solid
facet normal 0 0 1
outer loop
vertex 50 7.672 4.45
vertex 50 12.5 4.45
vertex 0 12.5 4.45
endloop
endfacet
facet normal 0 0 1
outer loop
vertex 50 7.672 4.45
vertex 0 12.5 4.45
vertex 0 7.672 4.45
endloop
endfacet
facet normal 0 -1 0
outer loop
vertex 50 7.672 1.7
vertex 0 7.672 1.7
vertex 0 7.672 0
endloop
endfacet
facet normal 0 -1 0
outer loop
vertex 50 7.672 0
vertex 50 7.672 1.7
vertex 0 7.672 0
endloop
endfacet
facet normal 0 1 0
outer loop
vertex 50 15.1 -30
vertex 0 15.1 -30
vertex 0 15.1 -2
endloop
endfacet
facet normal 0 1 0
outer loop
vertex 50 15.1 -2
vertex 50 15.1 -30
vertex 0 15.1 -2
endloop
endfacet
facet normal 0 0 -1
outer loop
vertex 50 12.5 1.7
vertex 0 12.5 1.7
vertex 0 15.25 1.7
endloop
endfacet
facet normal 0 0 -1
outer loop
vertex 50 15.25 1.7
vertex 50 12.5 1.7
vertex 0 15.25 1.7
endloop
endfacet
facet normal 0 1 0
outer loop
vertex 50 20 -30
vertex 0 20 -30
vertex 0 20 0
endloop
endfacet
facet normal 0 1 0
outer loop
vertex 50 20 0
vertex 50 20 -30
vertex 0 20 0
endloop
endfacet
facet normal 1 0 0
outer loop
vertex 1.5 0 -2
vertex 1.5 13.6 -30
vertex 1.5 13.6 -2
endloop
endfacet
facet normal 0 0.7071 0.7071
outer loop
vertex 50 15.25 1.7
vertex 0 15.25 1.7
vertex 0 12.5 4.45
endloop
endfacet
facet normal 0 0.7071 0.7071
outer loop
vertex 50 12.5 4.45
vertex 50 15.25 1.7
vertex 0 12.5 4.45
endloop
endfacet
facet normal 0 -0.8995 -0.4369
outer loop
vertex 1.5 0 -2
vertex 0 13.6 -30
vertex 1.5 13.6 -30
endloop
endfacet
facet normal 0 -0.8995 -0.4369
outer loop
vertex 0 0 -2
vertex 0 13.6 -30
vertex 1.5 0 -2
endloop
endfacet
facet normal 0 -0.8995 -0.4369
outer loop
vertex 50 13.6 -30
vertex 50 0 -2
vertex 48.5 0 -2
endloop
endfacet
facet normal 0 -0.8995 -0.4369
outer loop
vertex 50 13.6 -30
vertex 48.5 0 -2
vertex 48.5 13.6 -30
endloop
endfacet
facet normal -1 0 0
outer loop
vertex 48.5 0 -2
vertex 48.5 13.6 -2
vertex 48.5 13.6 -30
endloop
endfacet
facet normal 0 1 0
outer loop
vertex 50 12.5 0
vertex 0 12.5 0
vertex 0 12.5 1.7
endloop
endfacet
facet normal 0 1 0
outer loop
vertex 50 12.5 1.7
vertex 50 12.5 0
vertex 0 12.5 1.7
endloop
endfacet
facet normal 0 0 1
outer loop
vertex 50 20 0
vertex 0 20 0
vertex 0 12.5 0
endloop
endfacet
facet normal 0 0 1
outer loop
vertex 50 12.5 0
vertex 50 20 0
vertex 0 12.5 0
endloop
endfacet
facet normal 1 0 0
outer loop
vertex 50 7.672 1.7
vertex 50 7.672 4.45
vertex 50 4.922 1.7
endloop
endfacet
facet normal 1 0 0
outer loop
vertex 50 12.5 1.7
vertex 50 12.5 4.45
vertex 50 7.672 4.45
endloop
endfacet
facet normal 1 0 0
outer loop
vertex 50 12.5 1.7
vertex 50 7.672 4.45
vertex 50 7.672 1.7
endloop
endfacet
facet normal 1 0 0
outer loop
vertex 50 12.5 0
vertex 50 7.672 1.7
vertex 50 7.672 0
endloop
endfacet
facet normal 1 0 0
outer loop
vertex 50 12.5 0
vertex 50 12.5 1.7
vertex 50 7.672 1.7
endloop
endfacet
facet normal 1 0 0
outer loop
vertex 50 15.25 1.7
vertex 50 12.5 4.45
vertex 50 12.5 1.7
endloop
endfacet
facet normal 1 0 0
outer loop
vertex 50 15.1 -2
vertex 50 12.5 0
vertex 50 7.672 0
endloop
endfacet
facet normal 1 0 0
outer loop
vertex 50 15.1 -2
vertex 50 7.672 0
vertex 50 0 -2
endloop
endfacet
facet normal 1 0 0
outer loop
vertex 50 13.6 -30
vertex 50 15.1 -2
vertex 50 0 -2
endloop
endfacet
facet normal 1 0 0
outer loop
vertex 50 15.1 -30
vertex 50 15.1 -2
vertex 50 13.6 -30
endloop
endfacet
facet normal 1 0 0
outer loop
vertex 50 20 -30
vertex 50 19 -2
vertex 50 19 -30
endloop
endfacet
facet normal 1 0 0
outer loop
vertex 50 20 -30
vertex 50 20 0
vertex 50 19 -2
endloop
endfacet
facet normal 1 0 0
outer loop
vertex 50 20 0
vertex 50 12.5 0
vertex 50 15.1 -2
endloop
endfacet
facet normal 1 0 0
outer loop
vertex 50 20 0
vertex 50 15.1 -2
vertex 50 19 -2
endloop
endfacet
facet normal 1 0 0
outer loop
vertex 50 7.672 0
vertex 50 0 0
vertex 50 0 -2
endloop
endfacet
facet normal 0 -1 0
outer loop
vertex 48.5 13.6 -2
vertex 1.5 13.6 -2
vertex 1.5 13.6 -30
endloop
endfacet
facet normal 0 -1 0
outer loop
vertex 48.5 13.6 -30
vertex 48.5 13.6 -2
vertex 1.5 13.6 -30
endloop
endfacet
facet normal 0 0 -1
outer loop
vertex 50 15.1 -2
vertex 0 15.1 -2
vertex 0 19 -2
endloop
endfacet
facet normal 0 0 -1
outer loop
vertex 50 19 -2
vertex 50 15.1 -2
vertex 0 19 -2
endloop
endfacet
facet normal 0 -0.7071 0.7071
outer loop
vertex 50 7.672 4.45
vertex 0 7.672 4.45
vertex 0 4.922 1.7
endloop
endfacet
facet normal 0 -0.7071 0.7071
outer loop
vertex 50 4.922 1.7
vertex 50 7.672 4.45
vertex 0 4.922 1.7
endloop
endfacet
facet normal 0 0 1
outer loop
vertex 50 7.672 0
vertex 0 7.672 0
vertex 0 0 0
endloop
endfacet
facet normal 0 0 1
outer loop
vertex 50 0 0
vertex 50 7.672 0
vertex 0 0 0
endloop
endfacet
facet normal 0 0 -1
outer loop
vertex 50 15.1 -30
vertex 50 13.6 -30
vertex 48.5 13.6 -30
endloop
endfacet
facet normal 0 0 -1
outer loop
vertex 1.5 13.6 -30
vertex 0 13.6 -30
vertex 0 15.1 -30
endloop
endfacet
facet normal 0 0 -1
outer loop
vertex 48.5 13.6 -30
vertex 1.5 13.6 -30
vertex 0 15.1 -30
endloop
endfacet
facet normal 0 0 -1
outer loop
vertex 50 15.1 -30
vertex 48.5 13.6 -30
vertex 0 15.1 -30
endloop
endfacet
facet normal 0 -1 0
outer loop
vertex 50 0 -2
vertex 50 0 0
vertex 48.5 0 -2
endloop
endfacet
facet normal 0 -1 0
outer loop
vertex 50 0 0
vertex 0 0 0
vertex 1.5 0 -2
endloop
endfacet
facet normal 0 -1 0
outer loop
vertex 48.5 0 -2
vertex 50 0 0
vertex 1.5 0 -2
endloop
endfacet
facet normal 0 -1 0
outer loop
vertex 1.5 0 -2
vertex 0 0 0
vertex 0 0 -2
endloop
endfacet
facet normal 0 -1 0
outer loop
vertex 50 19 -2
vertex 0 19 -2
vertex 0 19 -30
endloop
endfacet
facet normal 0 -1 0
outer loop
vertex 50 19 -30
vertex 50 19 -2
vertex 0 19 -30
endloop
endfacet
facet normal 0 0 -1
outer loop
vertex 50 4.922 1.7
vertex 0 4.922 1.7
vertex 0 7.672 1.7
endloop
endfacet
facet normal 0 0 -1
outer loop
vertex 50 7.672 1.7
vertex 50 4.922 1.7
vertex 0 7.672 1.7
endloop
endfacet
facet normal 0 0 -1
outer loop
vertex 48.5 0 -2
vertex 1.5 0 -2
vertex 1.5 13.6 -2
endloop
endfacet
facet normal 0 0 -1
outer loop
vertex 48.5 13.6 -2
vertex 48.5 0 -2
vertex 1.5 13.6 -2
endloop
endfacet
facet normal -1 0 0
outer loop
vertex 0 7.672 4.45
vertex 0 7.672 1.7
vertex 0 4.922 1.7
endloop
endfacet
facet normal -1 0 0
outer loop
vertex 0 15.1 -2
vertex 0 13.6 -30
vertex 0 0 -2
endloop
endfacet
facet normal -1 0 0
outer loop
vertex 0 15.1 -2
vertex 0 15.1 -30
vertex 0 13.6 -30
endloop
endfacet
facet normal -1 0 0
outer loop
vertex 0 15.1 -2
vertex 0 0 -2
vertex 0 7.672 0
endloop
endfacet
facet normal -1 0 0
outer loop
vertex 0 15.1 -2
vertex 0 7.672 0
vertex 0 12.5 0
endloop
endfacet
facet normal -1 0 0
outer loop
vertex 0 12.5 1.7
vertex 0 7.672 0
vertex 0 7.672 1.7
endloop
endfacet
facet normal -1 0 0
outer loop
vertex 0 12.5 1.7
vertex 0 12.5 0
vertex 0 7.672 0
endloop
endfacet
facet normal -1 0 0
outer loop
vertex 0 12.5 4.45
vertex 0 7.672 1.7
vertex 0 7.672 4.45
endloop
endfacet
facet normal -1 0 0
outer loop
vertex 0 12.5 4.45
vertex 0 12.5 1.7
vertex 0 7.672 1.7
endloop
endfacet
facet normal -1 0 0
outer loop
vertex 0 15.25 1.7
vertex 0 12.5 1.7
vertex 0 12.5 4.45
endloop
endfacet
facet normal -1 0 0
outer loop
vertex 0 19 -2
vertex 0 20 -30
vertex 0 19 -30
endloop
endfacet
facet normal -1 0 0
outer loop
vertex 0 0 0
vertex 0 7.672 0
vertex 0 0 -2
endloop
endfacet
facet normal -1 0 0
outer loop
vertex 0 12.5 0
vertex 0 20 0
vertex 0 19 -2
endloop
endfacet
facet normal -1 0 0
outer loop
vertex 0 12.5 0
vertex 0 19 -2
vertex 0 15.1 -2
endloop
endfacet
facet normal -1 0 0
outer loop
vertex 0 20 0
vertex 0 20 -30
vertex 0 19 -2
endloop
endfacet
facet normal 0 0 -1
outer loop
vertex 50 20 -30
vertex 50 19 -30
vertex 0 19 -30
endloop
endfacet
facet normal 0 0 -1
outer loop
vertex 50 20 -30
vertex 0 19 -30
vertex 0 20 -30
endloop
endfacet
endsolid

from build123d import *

# Parameters (mm, degrees)
BOSS_EXTRUDE2_DEPTH  = 50
BOSS_EXTRUDE10_DEPTH = 1.5
BOSS_EXTRUDE11_DEPTH = 1.5


with BuildPart() as part:
    # Sketch1 → Boss-Extrude2 (new body)
    with BuildSketch(Plane(origin=(0, 0, 0), x_dir=(0, 0, -1), z_dir=(1, 0, 0))):
        Polygon((0, 7.671680622), (0, 0), (2, 0), (2, 13.6), (30, 13.6), (30, 15.1), (2, 15.1), (2, 19), (30, 19), (30, 20), (0, 20), (0, 12.5), (-1.7, 12.5), (-1.7, 15.25), (-4.45, 12.5), (-4.45, 7.671680622), (-1.7, 4.921680622), (-1.7, 7.671680622), align=None)
    extrude(amount=BOSS_EXTRUDE2_DEPTH)

    # Sketch1<13> → Boss-Extrude10 (add)
    with BuildSketch(Plane(origin=(0, 0, 0), x_dir=(0, 0, -1), z_dir=(1, 0, 0))):
        Polygon((2, 13.6), (2, 0), (30, 13.6), align=None)
    extrude(amount=BOSS_EXTRUDE10_DEPTH)

    # Sketch7 → Boss-Extrude11 (add)
    with BuildSketch(Plane(origin=(50, 0, 0), x_dir=(0, 0, -1), z_dir=(1, 0, 0))):
        Polygon((2, 13.6), (2, 0), (30, 13.6), align=None)
    extrude(amount=-BOSS_EXTRUDE11_DEPTH)


solid = part.part
